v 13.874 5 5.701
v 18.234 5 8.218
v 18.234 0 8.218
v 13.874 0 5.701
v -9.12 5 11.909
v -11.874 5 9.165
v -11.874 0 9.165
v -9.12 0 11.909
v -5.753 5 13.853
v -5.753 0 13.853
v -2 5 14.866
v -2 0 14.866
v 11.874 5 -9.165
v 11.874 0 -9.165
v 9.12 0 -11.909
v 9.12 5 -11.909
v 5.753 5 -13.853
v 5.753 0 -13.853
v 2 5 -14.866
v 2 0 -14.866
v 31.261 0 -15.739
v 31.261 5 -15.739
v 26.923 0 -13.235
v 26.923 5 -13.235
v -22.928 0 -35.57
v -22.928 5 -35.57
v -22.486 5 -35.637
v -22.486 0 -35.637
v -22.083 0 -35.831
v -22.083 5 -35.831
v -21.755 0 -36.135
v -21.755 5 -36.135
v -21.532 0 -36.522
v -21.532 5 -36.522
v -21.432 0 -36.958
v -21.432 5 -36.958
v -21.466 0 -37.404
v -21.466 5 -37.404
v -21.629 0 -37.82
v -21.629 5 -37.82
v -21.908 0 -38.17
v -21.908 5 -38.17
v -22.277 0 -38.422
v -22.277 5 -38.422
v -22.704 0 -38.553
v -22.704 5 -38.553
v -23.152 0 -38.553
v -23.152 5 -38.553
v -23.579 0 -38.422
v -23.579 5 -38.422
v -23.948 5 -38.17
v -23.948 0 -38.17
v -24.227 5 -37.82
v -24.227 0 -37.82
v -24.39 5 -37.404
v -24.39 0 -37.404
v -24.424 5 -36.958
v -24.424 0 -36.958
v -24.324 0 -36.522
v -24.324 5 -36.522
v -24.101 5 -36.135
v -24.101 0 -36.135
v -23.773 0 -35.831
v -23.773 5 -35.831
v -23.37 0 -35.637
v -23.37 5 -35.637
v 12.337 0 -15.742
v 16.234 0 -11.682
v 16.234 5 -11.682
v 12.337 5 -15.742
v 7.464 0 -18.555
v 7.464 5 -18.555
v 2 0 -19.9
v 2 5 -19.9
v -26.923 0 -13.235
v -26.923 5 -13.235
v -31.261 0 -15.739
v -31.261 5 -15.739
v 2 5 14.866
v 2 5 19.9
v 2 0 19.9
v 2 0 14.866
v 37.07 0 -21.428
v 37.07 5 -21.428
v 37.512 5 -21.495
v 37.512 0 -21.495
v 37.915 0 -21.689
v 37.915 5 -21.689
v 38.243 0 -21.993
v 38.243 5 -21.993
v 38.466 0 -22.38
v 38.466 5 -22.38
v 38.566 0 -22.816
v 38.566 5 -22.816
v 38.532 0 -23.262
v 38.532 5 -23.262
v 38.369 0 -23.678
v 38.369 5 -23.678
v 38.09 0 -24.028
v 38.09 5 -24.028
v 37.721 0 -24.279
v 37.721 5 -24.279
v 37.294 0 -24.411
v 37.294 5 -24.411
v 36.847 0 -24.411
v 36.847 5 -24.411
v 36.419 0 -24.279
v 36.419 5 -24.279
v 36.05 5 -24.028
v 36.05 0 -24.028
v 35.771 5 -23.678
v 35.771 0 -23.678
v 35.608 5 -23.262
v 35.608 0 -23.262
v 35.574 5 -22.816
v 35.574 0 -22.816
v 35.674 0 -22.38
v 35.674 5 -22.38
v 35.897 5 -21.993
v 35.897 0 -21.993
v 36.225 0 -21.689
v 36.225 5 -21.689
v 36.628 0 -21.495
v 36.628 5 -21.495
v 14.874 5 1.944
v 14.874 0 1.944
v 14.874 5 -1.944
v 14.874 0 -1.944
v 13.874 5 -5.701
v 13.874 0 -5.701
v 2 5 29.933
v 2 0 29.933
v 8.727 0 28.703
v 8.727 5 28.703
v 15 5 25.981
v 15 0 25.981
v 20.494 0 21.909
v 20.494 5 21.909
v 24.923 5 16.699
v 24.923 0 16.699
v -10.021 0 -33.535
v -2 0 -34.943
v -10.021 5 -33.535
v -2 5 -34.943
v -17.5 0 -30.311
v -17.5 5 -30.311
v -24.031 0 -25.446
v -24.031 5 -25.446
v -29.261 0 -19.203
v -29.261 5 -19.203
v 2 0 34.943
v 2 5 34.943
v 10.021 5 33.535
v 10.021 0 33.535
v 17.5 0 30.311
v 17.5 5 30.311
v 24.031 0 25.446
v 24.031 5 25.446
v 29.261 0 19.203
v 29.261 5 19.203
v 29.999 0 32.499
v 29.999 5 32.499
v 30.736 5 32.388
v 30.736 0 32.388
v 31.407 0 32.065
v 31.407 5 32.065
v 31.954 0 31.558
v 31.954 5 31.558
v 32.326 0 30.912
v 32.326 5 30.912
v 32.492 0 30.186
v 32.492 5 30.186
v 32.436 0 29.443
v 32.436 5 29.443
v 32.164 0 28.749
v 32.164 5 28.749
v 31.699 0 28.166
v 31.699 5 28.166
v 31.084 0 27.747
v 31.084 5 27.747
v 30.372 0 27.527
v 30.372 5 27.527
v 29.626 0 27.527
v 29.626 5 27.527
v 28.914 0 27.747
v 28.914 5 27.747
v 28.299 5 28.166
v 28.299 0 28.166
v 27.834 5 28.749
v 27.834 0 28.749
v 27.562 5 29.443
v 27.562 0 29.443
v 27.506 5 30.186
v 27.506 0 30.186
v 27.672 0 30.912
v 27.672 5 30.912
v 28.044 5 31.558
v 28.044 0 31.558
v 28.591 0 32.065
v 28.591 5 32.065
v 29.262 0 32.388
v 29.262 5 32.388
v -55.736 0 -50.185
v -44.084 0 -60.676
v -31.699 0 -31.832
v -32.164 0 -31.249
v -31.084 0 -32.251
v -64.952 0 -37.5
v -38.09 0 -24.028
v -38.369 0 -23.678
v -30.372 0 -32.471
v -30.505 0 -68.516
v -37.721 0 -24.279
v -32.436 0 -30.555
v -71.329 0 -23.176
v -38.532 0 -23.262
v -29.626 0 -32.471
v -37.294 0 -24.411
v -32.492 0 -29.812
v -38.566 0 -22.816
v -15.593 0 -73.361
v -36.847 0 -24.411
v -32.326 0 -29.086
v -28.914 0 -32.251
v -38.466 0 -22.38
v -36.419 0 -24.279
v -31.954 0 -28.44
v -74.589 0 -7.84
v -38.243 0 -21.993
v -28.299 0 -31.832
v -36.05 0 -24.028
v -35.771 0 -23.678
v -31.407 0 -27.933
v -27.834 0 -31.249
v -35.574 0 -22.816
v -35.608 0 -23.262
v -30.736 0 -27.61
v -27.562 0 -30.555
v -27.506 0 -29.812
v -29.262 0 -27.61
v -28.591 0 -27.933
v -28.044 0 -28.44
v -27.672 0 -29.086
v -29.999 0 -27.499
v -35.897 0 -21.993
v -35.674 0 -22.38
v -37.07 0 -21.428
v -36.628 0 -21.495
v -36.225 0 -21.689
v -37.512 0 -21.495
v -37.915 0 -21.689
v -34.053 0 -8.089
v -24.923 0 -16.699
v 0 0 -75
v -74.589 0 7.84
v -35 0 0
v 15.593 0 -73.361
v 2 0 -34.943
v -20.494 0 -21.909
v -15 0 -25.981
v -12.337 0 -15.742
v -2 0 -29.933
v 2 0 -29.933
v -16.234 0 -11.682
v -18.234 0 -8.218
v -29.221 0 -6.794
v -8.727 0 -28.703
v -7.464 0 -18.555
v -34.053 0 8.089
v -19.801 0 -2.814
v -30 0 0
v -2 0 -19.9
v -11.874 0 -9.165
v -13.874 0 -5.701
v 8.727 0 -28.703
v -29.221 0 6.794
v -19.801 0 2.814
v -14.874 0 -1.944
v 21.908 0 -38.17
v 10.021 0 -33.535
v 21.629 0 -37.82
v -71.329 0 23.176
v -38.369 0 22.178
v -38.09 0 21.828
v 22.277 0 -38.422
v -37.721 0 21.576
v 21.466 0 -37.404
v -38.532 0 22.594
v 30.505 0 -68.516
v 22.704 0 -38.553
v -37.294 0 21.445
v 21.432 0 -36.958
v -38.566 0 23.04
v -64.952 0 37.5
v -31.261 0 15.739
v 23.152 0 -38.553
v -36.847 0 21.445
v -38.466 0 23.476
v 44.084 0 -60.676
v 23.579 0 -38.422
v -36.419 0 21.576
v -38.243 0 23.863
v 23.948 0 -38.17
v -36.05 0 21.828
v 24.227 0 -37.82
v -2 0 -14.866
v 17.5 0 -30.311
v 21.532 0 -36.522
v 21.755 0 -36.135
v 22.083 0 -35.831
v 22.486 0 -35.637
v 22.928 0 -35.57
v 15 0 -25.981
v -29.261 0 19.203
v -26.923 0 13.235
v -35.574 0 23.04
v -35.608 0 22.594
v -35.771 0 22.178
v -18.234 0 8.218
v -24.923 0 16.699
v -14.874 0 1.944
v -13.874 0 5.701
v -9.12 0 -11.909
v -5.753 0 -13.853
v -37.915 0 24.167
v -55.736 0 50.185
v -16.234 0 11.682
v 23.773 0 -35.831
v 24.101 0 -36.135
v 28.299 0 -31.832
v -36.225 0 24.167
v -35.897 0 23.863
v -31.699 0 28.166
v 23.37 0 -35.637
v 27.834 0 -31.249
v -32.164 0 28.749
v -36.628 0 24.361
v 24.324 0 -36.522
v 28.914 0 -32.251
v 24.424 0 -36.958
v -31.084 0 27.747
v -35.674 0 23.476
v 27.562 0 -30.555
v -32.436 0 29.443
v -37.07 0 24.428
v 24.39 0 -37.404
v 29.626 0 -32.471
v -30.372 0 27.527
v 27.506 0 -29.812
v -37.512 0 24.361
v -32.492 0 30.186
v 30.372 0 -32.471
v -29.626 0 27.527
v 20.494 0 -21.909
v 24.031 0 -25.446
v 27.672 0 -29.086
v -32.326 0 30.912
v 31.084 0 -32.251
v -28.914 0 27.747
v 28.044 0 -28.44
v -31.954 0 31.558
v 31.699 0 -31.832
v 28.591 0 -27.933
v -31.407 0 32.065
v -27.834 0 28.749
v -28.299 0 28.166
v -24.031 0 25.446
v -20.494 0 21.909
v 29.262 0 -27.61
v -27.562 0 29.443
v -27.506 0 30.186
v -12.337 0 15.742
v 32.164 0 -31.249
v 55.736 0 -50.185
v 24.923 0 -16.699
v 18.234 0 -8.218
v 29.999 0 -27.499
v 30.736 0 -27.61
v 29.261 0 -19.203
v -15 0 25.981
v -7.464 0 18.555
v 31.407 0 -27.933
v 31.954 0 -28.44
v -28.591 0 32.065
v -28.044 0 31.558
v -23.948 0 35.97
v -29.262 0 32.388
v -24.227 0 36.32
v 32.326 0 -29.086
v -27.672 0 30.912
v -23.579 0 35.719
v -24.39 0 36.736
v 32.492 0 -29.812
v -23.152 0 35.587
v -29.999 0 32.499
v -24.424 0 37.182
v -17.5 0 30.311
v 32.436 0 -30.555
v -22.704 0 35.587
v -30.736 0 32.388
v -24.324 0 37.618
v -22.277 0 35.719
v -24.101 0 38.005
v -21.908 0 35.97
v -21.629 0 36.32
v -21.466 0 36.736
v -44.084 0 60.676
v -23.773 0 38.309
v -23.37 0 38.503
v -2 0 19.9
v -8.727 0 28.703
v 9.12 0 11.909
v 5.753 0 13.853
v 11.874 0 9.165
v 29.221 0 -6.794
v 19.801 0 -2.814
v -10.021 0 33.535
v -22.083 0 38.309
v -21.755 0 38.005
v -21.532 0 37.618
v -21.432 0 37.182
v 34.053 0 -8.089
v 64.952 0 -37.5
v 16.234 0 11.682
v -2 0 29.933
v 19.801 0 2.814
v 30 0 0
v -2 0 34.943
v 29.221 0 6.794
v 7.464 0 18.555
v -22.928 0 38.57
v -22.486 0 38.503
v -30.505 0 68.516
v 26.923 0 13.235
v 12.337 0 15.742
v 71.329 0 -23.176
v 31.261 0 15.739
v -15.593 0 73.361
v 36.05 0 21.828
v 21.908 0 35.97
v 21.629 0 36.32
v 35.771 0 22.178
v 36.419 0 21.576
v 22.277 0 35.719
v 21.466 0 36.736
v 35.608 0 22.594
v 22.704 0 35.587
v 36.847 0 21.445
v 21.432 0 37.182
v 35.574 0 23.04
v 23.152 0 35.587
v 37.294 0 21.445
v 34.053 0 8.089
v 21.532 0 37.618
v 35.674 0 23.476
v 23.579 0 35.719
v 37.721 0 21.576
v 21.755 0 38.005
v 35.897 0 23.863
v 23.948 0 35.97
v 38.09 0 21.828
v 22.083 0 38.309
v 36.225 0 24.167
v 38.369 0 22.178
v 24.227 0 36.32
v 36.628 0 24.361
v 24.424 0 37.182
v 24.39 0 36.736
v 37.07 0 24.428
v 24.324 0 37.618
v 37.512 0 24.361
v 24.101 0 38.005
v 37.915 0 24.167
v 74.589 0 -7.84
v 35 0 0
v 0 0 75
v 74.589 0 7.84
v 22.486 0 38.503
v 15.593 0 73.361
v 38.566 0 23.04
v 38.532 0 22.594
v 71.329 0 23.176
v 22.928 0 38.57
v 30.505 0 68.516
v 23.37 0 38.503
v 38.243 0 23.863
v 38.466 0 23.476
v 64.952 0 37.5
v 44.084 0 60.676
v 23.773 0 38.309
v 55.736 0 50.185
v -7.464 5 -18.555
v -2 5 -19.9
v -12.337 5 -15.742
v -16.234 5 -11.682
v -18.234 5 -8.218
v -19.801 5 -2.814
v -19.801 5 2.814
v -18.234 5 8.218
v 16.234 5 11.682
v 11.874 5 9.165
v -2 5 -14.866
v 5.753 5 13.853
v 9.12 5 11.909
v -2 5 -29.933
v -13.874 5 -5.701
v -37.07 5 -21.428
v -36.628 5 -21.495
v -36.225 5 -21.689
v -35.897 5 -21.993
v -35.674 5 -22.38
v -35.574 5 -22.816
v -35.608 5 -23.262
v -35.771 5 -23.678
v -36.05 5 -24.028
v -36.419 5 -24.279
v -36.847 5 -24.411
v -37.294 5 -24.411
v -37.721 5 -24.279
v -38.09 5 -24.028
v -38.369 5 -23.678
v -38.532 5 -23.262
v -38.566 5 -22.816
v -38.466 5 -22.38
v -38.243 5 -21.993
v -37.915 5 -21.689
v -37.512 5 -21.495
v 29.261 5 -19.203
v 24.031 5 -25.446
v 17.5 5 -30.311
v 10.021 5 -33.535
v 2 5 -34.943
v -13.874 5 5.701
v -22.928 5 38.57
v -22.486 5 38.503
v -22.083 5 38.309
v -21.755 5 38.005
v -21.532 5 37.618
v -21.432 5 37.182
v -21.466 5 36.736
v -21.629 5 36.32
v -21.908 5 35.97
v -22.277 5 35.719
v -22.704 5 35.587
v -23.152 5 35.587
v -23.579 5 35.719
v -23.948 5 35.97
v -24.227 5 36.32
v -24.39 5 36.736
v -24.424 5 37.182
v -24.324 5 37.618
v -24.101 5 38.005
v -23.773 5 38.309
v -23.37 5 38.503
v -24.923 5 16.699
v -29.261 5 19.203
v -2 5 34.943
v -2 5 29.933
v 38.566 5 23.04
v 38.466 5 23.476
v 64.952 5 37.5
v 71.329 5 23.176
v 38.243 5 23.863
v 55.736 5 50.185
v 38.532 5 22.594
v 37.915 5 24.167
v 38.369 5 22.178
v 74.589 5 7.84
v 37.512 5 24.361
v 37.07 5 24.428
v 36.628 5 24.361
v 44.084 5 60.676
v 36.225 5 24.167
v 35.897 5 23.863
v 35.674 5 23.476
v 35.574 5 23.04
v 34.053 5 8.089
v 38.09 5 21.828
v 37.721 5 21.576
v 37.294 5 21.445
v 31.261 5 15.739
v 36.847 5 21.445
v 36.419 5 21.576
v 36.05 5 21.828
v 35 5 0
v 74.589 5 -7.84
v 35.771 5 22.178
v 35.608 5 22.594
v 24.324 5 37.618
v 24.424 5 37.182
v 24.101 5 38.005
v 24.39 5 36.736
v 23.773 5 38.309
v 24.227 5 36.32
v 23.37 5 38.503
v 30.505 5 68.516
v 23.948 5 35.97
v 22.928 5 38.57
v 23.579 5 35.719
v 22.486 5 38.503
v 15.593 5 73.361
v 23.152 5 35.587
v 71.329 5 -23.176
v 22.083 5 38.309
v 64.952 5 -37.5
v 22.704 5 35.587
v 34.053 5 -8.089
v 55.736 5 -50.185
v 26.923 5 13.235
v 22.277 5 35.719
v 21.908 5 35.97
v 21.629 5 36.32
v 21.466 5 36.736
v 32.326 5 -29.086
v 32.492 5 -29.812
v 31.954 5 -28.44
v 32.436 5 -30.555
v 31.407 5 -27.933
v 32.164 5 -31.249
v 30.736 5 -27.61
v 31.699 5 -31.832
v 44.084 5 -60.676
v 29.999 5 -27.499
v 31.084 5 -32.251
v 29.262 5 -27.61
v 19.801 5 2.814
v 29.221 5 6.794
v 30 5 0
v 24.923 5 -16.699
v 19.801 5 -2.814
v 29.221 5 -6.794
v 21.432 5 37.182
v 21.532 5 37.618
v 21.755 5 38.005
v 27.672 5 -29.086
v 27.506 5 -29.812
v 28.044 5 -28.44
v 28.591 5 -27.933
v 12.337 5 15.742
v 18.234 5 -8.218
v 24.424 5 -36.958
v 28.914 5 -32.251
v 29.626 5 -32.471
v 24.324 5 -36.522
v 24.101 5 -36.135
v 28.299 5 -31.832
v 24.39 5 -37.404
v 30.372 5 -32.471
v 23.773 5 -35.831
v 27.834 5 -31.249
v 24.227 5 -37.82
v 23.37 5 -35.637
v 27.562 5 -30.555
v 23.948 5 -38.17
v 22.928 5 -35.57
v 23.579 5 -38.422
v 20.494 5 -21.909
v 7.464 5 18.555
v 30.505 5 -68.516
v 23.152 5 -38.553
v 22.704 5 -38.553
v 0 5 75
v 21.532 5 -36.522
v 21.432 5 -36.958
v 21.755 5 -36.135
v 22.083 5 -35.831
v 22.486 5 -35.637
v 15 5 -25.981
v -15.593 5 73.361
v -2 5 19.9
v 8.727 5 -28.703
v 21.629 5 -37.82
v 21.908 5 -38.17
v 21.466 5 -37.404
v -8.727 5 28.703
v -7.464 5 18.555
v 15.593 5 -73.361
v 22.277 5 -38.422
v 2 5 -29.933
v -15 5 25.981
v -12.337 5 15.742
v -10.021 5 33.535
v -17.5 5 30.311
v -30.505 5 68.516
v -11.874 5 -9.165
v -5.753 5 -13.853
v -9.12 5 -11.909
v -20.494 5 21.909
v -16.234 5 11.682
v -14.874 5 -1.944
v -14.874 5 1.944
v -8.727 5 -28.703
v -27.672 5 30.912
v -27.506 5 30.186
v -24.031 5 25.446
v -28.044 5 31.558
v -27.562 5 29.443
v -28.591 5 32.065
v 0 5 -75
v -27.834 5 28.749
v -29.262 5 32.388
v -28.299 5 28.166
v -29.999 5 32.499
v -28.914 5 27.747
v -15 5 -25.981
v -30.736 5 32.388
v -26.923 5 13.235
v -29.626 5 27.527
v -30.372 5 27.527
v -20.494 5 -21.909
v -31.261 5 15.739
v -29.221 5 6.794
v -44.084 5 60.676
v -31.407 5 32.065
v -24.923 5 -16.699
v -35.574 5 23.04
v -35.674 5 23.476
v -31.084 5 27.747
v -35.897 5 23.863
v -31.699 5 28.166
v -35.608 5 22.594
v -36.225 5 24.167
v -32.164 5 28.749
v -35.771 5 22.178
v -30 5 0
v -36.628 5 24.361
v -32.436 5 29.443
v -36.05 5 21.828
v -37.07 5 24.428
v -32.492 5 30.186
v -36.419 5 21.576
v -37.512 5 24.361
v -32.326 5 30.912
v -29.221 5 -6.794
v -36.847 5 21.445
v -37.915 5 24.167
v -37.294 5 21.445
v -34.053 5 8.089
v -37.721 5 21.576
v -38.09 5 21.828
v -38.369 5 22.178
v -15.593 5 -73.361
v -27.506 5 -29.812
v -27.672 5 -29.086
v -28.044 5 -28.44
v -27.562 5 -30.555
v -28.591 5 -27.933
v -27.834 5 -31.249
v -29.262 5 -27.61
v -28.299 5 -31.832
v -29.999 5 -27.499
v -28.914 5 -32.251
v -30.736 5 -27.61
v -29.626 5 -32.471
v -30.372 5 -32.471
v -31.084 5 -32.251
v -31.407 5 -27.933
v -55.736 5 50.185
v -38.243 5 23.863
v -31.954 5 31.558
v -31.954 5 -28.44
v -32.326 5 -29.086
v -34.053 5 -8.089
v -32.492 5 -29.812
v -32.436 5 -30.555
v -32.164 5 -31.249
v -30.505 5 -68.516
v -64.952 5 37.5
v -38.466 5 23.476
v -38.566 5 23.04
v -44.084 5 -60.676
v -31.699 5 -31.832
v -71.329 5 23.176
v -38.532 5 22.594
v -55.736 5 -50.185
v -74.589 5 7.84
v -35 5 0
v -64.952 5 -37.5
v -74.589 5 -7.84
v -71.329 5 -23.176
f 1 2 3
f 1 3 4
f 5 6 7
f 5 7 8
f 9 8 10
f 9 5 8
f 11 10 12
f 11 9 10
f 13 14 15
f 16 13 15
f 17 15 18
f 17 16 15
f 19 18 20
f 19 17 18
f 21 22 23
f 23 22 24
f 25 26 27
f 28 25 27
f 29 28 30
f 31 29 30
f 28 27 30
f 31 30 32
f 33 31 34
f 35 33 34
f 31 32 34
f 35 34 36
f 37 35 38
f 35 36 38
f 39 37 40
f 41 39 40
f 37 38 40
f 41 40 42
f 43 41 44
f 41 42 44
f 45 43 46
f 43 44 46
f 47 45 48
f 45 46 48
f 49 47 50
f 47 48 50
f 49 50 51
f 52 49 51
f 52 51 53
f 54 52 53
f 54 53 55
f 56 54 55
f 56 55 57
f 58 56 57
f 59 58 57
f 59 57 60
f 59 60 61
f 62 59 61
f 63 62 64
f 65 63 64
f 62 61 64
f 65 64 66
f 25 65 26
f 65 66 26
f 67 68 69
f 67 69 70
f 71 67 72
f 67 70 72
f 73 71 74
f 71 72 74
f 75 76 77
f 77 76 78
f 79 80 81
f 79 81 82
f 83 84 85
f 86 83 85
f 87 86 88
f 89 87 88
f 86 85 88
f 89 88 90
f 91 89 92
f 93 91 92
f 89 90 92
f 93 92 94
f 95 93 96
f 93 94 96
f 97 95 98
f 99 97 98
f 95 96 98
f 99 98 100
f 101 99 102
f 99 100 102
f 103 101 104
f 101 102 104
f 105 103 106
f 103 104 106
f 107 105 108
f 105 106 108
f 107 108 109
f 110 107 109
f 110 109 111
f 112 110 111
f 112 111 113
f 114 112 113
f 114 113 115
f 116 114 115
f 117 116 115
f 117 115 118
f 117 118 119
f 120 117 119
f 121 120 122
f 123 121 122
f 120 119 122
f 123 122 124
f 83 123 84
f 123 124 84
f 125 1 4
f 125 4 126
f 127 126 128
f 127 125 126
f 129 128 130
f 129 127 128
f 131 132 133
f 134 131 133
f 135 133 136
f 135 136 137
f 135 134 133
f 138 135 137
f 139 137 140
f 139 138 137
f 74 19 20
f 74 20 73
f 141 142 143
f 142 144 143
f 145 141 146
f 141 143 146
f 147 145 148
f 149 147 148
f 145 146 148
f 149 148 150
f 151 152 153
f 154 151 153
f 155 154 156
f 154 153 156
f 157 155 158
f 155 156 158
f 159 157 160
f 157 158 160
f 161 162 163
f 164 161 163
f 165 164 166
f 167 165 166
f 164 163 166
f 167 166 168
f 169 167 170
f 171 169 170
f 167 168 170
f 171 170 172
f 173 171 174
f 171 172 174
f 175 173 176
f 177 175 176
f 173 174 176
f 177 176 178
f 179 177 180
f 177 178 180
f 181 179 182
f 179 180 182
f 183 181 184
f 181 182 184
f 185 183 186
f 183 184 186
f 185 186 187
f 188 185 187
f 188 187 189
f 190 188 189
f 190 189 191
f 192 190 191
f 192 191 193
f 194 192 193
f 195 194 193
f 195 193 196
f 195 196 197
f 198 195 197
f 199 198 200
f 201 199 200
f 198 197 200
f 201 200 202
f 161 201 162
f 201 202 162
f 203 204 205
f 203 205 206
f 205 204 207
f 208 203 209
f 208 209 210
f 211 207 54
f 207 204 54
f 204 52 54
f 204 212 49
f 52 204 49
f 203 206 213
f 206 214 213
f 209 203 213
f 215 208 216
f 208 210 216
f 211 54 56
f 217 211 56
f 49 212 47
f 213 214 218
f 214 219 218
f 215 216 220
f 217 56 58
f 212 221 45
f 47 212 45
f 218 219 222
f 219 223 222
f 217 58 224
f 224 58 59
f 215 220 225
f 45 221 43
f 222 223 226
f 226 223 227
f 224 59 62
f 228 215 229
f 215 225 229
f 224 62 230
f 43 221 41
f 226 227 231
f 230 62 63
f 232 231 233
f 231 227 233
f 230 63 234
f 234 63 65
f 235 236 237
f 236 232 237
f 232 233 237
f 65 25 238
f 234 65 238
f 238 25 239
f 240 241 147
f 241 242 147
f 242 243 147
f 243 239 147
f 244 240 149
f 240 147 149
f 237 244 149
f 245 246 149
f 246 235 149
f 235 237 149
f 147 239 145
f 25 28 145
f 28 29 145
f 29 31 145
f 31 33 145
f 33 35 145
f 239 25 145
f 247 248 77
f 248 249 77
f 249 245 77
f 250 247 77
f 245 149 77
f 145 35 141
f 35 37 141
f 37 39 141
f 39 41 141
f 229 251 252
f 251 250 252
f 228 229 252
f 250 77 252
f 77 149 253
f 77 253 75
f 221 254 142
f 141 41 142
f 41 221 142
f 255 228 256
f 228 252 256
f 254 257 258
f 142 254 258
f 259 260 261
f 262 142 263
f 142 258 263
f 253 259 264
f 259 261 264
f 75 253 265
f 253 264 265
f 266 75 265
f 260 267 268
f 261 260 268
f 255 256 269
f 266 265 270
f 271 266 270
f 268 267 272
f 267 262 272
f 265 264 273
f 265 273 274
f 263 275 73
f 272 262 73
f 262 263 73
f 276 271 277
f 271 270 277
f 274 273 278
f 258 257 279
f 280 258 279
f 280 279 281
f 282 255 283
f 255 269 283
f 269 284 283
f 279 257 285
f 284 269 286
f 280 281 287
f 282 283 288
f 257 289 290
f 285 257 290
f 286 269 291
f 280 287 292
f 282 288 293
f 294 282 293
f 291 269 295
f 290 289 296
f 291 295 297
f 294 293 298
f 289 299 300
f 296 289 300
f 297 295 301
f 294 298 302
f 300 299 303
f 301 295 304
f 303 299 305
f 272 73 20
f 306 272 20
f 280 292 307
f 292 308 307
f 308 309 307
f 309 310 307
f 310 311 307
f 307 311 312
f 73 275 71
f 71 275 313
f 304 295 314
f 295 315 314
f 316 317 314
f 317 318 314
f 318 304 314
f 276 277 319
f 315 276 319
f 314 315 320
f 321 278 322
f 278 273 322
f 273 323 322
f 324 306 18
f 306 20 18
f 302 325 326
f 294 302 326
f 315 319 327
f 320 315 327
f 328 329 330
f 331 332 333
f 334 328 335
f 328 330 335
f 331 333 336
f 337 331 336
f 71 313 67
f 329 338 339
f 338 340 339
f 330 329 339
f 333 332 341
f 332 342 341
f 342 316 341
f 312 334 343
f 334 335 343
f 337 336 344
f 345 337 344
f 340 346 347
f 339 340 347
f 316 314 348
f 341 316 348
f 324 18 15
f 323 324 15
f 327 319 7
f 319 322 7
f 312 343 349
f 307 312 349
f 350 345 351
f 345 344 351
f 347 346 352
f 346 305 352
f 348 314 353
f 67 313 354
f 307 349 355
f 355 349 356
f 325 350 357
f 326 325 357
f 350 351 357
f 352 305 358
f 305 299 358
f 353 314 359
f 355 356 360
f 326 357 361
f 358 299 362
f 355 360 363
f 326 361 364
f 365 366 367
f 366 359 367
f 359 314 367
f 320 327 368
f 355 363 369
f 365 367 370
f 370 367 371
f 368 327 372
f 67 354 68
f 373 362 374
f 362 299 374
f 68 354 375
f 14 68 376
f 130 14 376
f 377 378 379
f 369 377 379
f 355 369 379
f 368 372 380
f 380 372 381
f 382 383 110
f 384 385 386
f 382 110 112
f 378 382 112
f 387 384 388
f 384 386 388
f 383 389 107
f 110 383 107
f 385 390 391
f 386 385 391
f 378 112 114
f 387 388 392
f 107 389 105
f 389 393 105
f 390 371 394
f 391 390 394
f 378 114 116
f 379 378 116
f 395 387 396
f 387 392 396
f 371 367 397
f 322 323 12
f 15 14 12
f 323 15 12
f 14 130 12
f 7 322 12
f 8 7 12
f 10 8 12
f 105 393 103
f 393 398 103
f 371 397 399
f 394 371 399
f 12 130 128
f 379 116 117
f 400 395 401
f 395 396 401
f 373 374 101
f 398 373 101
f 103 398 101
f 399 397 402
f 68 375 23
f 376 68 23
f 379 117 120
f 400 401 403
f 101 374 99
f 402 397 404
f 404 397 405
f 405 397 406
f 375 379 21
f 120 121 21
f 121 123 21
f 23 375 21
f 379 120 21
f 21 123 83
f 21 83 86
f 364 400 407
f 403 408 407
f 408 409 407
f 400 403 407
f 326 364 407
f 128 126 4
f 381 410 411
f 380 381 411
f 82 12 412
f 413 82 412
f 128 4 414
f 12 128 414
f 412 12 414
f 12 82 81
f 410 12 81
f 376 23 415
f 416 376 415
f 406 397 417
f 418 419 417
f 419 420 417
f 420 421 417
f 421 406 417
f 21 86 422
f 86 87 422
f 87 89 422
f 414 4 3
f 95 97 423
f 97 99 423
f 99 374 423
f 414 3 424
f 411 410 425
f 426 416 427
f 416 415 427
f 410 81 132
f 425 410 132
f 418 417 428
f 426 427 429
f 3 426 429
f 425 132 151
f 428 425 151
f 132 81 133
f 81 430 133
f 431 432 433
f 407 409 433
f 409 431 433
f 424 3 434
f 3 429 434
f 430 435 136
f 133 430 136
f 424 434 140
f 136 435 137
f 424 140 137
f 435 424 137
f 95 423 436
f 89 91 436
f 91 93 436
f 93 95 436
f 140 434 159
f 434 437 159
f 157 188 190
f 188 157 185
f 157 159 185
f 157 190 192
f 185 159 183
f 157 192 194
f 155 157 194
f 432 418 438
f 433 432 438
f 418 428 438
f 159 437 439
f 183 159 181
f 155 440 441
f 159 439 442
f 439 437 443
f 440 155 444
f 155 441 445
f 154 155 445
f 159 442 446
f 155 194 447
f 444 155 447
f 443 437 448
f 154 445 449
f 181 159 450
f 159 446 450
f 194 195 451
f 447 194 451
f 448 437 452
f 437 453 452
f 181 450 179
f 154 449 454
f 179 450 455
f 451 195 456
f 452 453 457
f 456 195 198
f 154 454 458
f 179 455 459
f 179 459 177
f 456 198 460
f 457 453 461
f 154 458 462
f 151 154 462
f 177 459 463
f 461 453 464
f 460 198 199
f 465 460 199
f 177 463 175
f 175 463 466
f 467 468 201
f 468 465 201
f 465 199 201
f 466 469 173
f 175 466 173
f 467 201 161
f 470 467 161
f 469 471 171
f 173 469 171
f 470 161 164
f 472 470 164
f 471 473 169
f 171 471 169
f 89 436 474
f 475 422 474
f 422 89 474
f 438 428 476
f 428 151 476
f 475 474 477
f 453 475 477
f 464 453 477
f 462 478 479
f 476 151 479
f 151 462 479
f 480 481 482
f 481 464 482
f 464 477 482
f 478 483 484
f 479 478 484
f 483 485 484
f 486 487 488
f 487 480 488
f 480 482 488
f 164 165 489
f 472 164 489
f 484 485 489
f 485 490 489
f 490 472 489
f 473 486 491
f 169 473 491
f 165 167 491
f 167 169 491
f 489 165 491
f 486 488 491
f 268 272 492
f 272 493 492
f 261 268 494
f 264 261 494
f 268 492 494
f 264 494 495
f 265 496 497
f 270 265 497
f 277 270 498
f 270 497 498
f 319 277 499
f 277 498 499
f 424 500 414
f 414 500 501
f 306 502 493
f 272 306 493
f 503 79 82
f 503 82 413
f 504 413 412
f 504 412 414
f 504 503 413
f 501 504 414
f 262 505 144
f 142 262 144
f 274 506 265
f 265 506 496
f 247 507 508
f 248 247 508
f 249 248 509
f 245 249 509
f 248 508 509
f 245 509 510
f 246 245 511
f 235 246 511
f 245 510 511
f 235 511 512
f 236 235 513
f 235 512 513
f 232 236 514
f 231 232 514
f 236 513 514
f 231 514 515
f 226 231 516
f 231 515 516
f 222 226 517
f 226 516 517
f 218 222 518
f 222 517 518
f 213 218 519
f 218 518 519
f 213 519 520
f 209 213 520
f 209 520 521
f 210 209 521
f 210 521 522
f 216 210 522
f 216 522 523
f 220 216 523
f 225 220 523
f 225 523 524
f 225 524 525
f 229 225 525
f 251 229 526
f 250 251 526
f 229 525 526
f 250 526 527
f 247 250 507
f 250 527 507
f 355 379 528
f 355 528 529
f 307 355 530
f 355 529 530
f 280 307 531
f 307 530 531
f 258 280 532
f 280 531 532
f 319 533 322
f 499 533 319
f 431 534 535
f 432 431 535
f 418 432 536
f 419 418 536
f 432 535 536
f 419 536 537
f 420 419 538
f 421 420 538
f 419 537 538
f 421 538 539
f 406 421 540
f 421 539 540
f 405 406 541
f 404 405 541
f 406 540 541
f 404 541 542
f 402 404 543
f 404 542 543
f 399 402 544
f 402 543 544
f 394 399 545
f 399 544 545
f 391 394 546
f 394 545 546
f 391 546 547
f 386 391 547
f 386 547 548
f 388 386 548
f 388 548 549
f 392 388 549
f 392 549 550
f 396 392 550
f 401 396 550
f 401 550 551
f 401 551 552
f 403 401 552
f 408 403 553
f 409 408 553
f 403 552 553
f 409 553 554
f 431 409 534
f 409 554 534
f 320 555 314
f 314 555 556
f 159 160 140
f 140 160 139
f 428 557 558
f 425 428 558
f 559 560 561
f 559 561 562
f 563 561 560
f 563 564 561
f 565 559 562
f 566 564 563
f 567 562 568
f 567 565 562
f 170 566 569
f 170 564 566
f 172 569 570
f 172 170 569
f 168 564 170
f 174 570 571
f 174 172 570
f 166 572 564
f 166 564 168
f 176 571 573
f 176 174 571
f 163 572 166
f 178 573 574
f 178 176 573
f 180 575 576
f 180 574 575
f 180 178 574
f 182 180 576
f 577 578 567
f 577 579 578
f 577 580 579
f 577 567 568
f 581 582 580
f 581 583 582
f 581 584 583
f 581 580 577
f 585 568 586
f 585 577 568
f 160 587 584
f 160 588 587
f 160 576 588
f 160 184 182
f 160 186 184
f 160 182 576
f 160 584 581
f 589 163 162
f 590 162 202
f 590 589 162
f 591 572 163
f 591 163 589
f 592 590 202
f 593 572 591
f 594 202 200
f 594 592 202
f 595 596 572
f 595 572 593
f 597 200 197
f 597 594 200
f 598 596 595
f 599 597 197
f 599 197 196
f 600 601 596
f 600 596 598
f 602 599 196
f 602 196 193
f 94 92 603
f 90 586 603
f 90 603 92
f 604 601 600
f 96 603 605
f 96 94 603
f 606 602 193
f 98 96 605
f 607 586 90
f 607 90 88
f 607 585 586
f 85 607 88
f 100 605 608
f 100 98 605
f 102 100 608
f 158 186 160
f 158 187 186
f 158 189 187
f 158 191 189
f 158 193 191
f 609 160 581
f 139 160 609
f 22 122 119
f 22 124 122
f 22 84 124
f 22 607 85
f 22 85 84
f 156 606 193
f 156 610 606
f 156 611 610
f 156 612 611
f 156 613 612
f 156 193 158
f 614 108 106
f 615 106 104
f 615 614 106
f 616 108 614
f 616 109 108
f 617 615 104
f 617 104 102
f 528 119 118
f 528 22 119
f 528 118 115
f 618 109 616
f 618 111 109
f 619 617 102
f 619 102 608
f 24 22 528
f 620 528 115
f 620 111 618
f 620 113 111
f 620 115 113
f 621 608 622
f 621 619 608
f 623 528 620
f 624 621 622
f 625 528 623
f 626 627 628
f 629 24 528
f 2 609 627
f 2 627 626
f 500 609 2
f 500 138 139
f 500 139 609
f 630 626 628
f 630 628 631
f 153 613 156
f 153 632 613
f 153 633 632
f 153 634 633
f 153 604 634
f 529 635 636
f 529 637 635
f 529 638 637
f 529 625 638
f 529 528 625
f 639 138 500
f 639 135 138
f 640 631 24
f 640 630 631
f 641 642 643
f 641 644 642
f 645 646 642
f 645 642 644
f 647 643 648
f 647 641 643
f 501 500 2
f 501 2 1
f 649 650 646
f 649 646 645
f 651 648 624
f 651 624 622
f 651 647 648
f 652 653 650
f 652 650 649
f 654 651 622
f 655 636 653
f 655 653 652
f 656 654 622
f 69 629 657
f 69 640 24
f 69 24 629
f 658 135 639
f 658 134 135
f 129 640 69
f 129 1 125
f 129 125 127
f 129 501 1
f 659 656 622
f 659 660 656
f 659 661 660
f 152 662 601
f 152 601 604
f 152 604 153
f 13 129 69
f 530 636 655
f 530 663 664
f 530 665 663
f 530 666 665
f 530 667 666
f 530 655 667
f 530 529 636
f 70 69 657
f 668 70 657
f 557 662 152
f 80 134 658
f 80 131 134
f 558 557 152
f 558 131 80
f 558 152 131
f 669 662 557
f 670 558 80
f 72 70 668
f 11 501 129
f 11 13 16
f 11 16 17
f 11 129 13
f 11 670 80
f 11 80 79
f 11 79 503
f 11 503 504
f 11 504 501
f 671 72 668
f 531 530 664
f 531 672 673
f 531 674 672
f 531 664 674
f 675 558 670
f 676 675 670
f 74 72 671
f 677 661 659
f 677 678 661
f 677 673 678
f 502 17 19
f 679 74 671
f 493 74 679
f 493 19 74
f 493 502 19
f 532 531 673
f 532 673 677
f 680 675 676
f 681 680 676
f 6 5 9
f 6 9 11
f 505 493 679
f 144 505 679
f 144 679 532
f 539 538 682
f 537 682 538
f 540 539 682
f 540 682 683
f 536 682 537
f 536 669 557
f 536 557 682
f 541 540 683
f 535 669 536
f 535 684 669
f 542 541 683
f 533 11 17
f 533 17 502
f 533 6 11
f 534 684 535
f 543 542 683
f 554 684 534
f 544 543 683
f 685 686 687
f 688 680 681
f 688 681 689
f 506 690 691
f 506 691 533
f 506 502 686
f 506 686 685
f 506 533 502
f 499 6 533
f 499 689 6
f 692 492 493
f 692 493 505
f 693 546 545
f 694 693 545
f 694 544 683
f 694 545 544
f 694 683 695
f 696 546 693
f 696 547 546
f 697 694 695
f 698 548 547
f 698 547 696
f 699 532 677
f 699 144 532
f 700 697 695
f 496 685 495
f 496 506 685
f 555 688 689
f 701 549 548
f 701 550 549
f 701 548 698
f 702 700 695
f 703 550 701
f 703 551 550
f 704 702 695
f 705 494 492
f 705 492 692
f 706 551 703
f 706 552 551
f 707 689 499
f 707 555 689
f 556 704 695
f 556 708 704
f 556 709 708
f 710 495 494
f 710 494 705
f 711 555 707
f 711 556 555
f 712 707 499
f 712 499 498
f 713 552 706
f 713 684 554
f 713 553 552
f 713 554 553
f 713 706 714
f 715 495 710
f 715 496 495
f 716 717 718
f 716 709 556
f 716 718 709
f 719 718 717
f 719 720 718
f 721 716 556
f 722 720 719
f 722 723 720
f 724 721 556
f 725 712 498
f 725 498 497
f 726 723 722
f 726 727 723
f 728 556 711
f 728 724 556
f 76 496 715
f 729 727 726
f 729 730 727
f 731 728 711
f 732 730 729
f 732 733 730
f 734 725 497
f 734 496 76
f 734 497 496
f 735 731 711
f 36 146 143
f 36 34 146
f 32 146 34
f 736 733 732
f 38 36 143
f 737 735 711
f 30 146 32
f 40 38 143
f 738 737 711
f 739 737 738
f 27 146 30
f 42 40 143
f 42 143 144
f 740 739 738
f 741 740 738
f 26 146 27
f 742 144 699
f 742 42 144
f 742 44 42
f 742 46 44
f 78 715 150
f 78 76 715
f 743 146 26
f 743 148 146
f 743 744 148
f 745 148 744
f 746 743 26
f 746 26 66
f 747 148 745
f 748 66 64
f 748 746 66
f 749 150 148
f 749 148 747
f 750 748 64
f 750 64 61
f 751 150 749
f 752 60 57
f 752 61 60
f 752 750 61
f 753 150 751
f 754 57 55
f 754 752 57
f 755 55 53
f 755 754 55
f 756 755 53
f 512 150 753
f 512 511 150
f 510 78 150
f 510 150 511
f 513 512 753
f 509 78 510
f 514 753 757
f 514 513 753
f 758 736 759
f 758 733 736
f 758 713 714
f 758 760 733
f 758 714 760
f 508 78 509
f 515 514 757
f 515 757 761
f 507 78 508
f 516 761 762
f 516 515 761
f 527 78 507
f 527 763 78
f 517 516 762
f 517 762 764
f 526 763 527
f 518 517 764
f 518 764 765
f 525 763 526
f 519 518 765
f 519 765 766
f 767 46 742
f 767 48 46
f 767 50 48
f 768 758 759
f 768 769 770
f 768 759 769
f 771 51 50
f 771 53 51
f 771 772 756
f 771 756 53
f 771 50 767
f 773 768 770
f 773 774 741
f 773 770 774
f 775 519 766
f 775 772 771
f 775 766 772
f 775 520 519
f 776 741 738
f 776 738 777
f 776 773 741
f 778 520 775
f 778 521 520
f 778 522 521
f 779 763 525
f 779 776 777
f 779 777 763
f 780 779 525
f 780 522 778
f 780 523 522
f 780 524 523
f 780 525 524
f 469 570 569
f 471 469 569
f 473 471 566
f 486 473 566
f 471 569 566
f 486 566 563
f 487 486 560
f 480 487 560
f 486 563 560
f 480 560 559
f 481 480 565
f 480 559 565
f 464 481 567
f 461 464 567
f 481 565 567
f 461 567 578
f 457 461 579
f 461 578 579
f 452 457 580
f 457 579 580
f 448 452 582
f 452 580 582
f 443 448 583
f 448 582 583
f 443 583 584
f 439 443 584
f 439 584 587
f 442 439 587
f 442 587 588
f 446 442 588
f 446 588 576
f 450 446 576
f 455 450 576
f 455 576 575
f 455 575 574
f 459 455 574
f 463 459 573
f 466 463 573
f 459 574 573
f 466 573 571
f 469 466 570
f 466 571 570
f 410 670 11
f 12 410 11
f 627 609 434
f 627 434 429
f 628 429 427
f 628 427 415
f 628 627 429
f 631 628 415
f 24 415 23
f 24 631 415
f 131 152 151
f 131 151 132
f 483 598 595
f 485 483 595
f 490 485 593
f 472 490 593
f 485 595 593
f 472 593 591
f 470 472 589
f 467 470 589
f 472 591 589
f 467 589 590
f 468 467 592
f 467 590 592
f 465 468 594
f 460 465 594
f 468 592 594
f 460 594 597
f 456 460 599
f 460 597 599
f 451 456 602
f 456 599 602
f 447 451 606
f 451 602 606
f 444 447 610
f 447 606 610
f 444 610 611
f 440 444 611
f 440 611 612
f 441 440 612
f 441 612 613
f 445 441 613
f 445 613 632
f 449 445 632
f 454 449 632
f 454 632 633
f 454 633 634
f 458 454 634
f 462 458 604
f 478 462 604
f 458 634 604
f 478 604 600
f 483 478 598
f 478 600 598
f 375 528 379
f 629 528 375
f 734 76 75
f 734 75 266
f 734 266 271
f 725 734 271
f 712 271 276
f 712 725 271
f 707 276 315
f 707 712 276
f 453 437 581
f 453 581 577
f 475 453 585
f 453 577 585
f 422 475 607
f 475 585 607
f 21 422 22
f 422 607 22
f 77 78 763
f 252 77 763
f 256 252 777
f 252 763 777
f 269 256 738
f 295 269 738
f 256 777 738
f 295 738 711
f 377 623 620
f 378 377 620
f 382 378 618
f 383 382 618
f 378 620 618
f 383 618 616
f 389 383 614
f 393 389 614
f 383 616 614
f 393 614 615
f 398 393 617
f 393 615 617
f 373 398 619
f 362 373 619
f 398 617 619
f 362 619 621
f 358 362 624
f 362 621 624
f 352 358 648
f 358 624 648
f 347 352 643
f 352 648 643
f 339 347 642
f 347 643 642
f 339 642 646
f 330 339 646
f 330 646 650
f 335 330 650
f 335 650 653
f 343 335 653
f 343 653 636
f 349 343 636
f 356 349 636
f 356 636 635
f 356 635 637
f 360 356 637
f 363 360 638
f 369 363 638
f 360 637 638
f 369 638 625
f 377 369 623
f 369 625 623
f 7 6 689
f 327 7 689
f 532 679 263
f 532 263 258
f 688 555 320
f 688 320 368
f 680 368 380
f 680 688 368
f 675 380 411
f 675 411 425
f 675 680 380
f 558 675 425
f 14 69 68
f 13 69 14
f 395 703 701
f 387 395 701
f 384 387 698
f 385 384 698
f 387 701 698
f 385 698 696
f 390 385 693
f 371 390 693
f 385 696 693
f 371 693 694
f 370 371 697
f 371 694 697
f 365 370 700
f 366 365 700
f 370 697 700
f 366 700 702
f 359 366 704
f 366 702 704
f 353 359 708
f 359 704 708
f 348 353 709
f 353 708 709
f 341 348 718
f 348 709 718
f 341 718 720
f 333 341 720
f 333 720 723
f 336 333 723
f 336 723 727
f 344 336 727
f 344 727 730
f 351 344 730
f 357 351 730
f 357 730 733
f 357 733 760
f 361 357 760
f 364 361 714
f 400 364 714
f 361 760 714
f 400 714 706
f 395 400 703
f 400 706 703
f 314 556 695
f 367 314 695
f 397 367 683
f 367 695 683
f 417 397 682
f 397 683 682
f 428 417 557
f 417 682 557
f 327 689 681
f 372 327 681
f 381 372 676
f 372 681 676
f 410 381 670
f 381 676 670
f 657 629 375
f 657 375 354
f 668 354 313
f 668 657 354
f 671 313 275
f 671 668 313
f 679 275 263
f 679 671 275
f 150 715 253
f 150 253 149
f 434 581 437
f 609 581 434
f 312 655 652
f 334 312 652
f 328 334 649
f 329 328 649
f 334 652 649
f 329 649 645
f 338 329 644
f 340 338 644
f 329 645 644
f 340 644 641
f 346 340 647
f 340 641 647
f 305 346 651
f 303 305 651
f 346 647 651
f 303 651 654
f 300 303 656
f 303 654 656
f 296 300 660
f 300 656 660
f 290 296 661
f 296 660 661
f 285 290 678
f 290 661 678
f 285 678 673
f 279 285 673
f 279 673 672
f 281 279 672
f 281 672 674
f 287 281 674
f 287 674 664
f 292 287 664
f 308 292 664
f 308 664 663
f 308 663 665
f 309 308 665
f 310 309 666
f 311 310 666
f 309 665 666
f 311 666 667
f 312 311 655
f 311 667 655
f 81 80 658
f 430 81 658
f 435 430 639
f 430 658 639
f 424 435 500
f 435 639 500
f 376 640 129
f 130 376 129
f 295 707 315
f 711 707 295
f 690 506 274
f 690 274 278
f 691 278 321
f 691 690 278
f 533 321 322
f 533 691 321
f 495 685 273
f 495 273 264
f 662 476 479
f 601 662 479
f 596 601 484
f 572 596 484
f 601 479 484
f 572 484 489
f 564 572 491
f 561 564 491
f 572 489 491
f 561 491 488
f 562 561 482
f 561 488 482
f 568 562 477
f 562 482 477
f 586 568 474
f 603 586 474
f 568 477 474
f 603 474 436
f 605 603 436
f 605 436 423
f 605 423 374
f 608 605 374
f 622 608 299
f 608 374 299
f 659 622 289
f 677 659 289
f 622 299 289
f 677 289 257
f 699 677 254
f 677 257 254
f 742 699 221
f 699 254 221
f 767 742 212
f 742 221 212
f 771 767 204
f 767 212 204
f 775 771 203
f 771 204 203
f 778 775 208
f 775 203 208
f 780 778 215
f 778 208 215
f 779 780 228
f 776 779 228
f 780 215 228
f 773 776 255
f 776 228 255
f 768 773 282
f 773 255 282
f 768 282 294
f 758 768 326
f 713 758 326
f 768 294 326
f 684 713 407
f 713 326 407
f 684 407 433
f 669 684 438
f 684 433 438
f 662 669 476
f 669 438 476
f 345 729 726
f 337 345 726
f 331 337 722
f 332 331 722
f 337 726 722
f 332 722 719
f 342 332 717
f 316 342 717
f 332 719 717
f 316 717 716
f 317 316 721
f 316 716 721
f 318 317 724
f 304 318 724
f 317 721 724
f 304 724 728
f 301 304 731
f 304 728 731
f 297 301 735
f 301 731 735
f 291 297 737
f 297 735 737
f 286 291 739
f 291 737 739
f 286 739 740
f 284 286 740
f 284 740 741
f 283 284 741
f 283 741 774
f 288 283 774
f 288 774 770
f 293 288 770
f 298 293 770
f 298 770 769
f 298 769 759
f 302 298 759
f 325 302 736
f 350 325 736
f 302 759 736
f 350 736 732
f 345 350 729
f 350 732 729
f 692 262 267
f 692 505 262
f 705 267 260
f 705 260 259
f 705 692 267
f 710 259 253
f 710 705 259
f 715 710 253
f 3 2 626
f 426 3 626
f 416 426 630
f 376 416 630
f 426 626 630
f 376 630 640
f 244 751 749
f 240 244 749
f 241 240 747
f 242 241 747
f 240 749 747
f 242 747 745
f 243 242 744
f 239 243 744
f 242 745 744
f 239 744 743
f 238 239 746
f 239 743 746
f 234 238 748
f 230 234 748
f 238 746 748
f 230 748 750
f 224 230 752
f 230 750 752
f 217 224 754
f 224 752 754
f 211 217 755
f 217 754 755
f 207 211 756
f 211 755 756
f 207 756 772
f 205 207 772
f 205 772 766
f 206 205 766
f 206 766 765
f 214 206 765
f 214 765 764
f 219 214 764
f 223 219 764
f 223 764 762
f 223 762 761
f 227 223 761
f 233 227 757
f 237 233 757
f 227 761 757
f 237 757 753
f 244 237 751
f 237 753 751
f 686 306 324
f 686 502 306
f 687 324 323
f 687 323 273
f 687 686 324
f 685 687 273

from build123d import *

# Parameters (mm, degrees)
SKETCH1_R           = 75
BOSS_EXTRUDE1_DEPTH = 5
SKETCH2_R           = 2.5
SKETCH2_R_2         = 1.5
CUT_EXTRUDE1_DEPTH  = 5
SKETCH3_R           = 35
SKETCH3_R_2         = 30
SKETCH3_R_3         = 20
SKETCH3_R_4         = 15
CUT_EXTRUDE3_DEPTH  = 5
SKETCH4_W           = 4
SKETCH4_H           = 72.786785362
BOSS_EXTRUDE2_DEPTH = 5
CIRPATTERN1_COUNT   = 6


with BuildPart() as part:
    # Sketch1 → Boss-Extrude1 (new body)
    with BuildSketch(Plane(origin=(0, 0, 0), x_dir=(1, 0, 0), z_dir=(0, 1, 0))):
        Circle(SKETCH1_R)
    extrude(amount=BOSS_EXTRUDE1_DEPTH)

    # Sketch2 → Cut-Extrude1 (cut)
    with BuildSketch(Plane(origin=(0, 5, 0), x_dir=(1, 0, 0), z_dir=(0, 1, 0))):
        with Locations((-29.999005192, 29.999005192)):
            Circle(SKETCH2_R)
        with Locations((29.999005192, 29.999005192)):
            Circle(SKETCH2_R)
        with Locations((29.999005192, -29.999005192)):
            Circle(SKETCH2_R)
        with Locations((-29.999005192, -29.999005192)):
            Circle(SKETCH2_R)
        with Locations((-22.92793738, 37.070073004)):
            Circle(SKETCH2_R_2)
        with Locations((-37.070073004, 22.92793738)):
            Circle(SKETCH2_R_2)
        with Locations((22.92793738, 37.070073004)):
            Circle(SKETCH2_R_2)
        with Locations((37.070073004, 22.92793738)):
            Circle(SKETCH2_R_2)
        with Locations((-37.070073004, -22.92793738)):
            Circle(SKETCH2_R_2)
        with Locations((-22.92793738, -37.070073004)):
            Circle(SKETCH2_R_2)
        with Locations((22.92793738, -37.070073004)):
            Circle(SKETCH2_R_2)
        with Locations((37.070073004, -22.92793738)):
            Circle(SKETCH2_R_2)
    extrude(amount=-CUT_EXTRUDE1_DEPTH, mode=Mode.SUBTRACT)

    # Sketch3 → Cut-Extrude3 (cut)
    # profile 1 of 2: a face of its own
    with BuildSketch(Plane(origin=(0, 5, 0), x_dir=(1, 0, 0), z_dir=(0, 1, 0))):
        Circle(SKETCH3_R)
        Circle(SKETCH3_R_2, mode=Mode.SUBTRACT)
    # profile 2 of 2: a face of its own
    with BuildSketch(Plane(origin=(0, 5, 0), x_dir=(1, 0, 0), z_dir=(0, 1, 0))):
        Circle(SKETCH3_R_3)
        Circle(SKETCH3_R_4, mode=Mode.SUBTRACT)
    extrude(amount=-CUT_EXTRUDE3_DEPTH, mode=Mode.SUBTRACT)


with BuildPart() as cut_extrude3_piece_1:
    # of the separate pieces the step leaves, piece 1, a body of its own (cut_extrude3_pieces)
    add(part.part.solids().sort_by_distance((75, 0, 0))[0])



with BuildPart() as cut_extrude3_piece_2:
    # of the separate pieces the step leaves, piece 2, a body of its own (cut_extrude3_pieces)
    add(part.part.solids().sort_by_distance((30, 0, 0))[0])


with BuildPart() as cut_extrude3_piece_3:
    # of the separate pieces the step leaves, piece 3, a body of its own (cut_extrude3_pieces)
    add(part.part.solids().sort_by_distance((15, 0, 0))[0])


with BuildPart() as cut_extrude3_piece_1_1:
    add(cut_extrude3_piece_1.part)

    add(cut_extrude3_piece_2.part)  # Boss-Extrude2 merges Cut-Extrude3 piece 2

    add(cut_extrude3_piece_3.part)  # Boss-Extrude2 merges Cut-Extrude3 piece 3
    # Sketch4 → Boss-Extrude2 (add)
    with BuildSketch(Plane(origin=(0, 5, 0), x_dir=(1, 0, 0), z_dir=(0, 1, 0))):
        Rectangle(SKETCH4_W, SKETCH4_H)
    boss_extrude2 = extrude(amount=-BOSS_EXTRUDE2_DEPTH)

    # CirPattern1: Boss-Extrude2 ×6 about axis
    cirpattern1_axis = Axis((0, 5, 0), (0, 1, 0))
    for i in range(1, CIRPATTERN1_COUNT):
        add(boss_extrude2.rotate(cirpattern1_axis, i * 360 / CIRPATTERN1_COUNT))


solid = cut_extrude3_piece_1_1.part
